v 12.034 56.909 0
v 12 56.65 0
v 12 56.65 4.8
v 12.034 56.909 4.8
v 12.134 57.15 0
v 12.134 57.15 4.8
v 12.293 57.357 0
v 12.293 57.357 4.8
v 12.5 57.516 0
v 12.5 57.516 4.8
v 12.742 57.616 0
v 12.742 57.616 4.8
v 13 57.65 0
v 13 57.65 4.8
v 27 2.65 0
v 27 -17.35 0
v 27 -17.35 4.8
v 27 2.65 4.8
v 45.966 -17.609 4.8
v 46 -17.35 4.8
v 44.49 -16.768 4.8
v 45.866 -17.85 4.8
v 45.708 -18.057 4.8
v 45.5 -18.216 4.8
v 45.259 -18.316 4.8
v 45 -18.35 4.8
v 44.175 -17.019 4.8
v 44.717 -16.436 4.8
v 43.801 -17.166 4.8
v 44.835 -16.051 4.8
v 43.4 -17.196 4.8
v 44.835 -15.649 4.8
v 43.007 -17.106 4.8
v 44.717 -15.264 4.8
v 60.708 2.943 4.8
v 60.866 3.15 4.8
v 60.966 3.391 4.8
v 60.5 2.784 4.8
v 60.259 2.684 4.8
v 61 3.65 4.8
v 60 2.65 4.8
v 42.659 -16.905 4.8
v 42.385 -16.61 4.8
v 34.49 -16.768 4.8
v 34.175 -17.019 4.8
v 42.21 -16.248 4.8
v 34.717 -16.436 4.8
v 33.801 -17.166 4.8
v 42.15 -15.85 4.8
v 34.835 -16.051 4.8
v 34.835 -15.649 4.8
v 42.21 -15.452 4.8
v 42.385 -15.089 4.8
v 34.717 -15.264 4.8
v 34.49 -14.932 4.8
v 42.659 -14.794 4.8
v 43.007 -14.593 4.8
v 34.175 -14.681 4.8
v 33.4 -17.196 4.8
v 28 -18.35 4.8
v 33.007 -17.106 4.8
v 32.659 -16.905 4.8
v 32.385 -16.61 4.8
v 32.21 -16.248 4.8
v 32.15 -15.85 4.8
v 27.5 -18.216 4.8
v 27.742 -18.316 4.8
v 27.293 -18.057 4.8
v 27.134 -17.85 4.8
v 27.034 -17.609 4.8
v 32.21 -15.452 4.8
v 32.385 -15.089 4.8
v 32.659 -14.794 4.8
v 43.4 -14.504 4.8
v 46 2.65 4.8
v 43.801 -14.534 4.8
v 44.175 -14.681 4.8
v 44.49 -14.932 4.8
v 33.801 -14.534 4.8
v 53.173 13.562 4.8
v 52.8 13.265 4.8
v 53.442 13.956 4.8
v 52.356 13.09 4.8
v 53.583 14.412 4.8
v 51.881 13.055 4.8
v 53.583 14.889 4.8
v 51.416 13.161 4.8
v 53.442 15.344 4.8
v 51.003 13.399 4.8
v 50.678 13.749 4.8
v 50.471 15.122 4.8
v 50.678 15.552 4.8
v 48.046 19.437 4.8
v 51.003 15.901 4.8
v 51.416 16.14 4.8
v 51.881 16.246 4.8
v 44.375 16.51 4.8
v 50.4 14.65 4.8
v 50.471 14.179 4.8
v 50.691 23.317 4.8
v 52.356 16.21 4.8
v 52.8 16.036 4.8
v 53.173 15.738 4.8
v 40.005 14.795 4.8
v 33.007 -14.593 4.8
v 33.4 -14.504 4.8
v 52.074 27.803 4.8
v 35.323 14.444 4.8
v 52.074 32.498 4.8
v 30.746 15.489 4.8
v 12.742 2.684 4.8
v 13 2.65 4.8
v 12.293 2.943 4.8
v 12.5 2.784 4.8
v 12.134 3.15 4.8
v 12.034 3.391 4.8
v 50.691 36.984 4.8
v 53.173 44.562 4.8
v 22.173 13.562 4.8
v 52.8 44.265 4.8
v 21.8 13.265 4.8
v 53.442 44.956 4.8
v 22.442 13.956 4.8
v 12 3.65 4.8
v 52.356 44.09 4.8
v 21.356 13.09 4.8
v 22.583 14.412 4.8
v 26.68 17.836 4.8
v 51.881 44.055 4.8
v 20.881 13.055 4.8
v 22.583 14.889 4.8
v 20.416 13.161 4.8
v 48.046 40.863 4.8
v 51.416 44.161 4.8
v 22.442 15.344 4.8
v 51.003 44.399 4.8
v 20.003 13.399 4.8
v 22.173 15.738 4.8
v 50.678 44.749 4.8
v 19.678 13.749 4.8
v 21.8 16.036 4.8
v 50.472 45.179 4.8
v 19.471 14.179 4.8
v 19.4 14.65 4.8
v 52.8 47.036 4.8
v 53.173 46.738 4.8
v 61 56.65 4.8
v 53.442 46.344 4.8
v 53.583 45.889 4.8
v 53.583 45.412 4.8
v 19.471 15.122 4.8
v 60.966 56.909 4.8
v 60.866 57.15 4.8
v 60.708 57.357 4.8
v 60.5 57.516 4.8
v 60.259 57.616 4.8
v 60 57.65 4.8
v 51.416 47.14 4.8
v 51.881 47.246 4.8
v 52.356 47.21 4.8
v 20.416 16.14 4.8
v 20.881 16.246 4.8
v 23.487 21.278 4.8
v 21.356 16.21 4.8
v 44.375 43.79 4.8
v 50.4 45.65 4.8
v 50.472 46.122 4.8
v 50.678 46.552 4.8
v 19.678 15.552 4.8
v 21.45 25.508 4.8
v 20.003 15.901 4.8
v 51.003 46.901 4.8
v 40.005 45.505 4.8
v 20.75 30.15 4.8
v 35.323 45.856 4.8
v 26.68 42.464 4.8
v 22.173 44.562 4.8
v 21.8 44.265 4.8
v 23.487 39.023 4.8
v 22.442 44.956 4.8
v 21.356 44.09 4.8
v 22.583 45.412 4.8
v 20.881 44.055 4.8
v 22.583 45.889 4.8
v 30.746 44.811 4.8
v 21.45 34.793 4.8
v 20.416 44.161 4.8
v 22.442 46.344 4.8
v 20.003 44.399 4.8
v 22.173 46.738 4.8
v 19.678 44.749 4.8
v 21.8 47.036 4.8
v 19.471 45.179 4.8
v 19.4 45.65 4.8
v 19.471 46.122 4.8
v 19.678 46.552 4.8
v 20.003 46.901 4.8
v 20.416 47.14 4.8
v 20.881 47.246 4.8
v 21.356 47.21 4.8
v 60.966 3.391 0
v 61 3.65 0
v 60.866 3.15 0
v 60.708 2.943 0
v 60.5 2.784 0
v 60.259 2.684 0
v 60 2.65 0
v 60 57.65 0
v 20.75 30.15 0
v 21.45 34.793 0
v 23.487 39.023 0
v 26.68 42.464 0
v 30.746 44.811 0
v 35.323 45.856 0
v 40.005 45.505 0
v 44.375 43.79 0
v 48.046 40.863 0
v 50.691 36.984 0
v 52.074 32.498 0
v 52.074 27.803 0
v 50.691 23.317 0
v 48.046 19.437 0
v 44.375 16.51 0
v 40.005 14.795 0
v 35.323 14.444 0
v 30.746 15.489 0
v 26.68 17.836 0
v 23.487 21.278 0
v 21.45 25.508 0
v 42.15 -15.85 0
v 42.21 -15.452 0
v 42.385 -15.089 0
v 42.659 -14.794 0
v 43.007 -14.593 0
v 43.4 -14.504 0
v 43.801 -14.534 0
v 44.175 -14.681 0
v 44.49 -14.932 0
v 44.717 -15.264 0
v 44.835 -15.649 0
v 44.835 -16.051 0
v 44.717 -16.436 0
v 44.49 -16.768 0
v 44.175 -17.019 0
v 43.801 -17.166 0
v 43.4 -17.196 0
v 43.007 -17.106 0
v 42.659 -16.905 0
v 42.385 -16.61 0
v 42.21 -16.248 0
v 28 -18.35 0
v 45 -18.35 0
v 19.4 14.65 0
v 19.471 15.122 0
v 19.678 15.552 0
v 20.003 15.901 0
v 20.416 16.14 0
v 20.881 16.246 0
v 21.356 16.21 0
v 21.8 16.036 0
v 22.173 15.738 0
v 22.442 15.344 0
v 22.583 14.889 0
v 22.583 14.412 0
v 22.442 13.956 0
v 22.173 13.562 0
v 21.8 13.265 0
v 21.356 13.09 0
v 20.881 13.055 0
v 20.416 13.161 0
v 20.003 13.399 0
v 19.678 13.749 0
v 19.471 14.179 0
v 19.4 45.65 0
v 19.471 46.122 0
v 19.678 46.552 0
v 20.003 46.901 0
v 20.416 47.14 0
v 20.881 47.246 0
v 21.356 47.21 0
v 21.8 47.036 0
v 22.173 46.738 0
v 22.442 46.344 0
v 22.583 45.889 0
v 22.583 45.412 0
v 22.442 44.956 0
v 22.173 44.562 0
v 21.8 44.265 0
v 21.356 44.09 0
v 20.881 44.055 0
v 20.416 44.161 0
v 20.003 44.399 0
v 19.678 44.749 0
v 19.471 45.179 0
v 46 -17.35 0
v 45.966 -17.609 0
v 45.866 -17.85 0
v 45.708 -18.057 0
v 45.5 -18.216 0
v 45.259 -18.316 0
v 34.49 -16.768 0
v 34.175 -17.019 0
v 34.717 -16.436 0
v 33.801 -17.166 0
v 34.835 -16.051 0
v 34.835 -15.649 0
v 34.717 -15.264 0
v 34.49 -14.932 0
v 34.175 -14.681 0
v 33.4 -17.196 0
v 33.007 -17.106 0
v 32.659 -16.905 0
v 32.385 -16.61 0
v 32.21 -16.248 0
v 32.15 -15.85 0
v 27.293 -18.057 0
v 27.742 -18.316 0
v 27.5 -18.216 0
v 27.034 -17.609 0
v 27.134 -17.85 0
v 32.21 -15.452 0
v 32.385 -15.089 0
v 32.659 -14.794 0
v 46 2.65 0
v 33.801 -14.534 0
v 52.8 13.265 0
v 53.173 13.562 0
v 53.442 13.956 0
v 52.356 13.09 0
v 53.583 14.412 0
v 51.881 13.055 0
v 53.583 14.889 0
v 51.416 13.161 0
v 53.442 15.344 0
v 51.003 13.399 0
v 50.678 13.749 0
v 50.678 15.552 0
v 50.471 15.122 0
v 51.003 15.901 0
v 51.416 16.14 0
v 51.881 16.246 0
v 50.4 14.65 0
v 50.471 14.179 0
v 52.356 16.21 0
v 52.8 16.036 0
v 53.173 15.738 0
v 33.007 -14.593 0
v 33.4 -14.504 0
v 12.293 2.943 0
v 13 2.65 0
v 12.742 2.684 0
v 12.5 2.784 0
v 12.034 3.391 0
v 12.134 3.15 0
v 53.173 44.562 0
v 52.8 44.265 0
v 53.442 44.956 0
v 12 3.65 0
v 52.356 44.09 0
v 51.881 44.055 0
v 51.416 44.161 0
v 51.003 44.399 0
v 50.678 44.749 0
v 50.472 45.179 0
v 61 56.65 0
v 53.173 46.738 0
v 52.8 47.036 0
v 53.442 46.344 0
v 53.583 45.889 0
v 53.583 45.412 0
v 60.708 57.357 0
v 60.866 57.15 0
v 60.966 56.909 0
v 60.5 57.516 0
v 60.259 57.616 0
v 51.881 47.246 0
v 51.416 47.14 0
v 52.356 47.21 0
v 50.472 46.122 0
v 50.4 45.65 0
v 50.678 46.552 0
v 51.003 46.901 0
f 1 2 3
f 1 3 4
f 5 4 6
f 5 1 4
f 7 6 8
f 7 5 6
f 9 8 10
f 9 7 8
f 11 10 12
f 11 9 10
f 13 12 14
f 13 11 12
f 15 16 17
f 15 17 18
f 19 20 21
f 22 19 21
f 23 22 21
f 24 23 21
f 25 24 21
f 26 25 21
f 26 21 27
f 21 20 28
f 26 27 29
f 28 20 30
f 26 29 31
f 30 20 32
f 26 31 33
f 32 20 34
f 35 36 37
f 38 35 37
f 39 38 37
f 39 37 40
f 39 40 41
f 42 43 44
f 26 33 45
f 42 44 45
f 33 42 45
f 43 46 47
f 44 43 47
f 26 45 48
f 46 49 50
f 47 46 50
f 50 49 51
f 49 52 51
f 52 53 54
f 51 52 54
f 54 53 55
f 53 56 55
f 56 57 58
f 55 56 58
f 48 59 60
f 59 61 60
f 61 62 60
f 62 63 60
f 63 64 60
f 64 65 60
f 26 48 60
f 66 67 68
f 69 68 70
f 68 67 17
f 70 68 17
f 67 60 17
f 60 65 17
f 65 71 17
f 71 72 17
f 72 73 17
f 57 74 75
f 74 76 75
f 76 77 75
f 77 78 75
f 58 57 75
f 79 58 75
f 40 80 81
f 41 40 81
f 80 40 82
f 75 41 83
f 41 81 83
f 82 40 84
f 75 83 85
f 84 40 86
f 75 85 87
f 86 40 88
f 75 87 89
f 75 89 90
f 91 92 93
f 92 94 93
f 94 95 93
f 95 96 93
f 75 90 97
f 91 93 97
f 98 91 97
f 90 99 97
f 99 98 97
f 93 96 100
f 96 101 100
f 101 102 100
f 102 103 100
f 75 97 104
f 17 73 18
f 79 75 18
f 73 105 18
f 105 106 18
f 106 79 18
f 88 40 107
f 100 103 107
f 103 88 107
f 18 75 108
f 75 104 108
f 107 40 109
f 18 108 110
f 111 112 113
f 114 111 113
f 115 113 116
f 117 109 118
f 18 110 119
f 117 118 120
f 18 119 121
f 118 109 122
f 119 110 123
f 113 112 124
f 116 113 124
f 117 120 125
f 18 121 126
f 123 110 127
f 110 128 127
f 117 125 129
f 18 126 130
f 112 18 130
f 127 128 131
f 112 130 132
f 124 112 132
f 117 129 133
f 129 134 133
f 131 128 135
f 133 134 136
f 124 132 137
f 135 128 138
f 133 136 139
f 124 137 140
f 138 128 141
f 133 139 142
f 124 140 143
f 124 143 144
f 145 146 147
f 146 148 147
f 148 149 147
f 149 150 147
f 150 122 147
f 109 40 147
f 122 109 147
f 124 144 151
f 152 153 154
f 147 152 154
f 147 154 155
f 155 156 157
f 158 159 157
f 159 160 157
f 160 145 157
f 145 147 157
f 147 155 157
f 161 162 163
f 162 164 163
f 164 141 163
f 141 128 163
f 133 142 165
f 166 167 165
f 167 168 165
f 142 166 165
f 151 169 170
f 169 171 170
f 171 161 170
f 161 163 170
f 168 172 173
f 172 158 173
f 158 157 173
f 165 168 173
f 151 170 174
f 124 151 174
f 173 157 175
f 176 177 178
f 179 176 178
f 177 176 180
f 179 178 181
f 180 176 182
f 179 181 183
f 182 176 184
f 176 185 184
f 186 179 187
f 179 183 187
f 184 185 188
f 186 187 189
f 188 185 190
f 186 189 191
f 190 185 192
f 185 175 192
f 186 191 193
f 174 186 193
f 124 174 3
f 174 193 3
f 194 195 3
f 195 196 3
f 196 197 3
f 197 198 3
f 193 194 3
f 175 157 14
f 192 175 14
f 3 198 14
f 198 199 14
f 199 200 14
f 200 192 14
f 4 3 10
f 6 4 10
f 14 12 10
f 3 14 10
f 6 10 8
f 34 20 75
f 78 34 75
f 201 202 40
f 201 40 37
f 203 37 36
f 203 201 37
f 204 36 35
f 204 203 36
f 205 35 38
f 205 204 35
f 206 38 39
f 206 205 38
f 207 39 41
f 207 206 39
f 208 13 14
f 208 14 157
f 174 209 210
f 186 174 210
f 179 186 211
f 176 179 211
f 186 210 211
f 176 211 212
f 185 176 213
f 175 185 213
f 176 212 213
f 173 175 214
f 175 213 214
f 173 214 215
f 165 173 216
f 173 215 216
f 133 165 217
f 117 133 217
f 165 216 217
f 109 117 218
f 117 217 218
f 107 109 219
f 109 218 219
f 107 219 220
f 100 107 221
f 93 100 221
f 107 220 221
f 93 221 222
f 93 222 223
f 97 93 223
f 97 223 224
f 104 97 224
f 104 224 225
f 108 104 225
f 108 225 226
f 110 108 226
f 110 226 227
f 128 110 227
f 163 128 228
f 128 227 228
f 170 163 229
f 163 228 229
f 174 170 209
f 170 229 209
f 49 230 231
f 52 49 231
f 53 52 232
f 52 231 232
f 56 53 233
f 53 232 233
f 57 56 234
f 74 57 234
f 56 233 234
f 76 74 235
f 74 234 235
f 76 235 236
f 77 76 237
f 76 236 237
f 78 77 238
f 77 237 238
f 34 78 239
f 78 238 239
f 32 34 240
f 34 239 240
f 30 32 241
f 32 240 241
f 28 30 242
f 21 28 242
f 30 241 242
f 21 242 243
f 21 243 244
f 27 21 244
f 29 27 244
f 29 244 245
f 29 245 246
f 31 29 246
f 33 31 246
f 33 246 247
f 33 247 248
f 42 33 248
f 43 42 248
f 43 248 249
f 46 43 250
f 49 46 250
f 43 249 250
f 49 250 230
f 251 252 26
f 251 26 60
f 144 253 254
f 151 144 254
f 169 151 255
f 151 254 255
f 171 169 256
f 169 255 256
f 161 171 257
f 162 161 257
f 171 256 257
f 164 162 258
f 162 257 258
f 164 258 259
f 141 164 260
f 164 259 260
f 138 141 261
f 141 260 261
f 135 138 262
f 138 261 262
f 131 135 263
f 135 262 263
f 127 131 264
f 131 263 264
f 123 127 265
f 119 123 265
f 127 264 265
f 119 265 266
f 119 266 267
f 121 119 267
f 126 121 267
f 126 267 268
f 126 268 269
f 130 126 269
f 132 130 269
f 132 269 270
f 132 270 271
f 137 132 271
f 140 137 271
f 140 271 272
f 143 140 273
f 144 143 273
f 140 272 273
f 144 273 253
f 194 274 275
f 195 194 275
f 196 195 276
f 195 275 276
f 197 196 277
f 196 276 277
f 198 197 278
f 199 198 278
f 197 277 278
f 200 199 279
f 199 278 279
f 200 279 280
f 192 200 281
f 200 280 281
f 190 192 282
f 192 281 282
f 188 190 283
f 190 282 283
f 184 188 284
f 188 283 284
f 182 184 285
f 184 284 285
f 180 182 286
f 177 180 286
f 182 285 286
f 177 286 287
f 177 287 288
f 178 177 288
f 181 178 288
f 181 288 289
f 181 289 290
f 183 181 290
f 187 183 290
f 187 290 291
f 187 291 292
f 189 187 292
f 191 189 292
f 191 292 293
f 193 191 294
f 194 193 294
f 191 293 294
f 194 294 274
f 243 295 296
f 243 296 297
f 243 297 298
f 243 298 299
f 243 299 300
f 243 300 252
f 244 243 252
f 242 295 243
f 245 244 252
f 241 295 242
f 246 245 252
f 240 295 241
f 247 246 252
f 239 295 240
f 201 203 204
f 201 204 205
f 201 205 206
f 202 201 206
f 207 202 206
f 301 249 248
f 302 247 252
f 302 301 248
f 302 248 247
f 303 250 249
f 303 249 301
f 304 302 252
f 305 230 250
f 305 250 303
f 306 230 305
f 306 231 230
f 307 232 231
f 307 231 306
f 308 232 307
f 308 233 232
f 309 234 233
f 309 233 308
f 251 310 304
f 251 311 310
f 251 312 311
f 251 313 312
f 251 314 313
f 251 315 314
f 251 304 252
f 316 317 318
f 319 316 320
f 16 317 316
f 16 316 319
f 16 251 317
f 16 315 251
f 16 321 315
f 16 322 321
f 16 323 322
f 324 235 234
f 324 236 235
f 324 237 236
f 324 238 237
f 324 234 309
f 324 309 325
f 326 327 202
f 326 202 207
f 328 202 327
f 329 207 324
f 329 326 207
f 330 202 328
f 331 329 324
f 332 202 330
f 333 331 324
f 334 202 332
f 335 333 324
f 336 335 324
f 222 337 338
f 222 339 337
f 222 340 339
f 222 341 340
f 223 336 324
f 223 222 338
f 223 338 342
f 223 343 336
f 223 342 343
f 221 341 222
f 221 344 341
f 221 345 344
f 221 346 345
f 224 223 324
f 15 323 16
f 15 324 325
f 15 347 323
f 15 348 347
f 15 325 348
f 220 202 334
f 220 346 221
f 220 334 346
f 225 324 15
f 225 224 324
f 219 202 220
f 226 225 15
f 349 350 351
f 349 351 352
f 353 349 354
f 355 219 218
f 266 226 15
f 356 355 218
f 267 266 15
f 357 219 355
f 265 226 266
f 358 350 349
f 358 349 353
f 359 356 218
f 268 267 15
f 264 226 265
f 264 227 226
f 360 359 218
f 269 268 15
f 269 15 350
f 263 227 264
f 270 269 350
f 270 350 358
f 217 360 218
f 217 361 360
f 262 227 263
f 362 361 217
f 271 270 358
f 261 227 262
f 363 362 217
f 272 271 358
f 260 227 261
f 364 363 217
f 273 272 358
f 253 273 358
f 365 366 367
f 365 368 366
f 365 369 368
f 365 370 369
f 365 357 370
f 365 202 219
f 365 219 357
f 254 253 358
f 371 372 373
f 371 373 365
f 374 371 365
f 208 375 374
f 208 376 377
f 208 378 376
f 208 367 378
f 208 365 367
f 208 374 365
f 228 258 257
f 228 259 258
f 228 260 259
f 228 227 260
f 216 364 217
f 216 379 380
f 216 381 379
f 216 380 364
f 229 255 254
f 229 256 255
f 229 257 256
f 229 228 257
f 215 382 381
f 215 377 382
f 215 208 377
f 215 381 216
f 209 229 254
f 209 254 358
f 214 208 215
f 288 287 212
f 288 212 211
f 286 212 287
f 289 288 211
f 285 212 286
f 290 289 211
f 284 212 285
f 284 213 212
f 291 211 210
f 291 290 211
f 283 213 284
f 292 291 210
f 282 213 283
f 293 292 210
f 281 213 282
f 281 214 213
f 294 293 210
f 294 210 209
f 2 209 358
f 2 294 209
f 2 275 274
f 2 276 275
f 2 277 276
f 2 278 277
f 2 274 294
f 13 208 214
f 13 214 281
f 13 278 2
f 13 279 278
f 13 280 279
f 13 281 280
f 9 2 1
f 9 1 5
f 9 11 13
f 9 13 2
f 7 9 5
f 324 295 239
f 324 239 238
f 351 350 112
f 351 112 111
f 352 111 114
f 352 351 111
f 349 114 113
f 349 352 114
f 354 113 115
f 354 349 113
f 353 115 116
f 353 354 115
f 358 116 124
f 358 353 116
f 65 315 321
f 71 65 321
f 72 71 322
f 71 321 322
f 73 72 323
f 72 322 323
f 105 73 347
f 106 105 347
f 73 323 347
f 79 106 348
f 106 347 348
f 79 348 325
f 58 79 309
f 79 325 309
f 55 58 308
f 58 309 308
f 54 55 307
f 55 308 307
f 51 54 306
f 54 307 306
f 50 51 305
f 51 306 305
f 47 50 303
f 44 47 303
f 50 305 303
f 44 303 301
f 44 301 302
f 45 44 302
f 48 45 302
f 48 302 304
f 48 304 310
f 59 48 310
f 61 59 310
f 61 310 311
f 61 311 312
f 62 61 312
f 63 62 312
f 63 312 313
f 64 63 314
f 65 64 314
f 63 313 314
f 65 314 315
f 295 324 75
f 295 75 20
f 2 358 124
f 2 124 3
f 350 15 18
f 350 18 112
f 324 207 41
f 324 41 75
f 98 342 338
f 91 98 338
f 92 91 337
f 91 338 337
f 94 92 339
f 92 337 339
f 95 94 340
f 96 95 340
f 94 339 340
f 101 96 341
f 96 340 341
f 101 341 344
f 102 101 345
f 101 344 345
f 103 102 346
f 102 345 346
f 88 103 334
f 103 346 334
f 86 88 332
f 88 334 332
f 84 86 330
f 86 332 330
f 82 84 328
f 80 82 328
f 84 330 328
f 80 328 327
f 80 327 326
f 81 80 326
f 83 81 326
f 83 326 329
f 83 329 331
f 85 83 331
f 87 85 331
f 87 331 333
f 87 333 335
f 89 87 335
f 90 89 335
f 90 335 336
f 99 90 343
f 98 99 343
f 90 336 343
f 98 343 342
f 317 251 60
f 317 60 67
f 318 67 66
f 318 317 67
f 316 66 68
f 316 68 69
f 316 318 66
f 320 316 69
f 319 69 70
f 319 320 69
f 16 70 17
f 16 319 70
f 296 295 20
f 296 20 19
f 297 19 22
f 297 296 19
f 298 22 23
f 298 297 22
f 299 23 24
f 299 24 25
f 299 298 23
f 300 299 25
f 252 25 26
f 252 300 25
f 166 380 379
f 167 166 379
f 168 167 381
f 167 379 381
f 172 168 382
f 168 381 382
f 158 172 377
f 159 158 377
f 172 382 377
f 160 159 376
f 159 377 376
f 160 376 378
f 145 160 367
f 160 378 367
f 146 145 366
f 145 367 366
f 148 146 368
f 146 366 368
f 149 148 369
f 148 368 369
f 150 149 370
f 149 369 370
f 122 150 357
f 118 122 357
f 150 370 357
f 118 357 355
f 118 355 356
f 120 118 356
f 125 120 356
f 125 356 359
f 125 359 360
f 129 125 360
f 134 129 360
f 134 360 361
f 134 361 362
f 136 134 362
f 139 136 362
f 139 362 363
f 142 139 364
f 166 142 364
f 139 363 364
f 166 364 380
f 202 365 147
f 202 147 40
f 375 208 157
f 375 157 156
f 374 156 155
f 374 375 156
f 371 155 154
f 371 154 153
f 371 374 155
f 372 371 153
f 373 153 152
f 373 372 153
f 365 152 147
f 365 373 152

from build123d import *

# Parameters (mm, degrees)
ESQUISSE1_R        = 15.75
ESQUISSE1_R_2      = 1.6
ESQUISSE1_R_3      = 1.35
BOSS_EXTRU_1_DEPTH = 4.8


with BuildPart() as part:
    # Esquisse1 → Boss.-Extru.1 (new body)
    with BuildSketch(Plane(origin=(0, 0, 0), x_dir=(-1, 0, 0), z_dir=(0, 0, -1))):
        with BuildLine():
            Line((-12.0004012, 3.650219609), (-12.0004012, 56.650219609))
            ThreePointArc((-12.0004012, 56.650219609), (-12.293294419, 57.35732639), (-13.0004012, 57.650219609))
            Line((-13.0004012, 57.650219609), (-60.0004012, 57.650219609))
            ThreePointArc((-60.0004012, 57.650219609), (-60.707507981, 57.35732639), (-61.0004012, 56.650219609))
            Line((-61.0004012, 56.650219609), (-61.0004012, 3.650219609))
            ThreePointArc((-61.0004012, 3.650219609), (-60.707507981, 2.943112828), (-60.0004012, 2.650219609))
            Line((-60.0004012, 2.650219609), (-46.0004012, 2.650219609))
            Line((-46.0004012, 2.650219609), (-46.0004012, -17.349780391))
            ThreePointArc((-46.0004012, -17.349780391), (-45.707507981, -18.056887172), (-45.0004012, -18.349780391))
            Line((-45.0004012, -18.349780391), (-28.0004012, -18.349780391))
            ThreePointArc((-28.0004012, -18.349780391), (-27.293294419, -18.056887172), (-27.0004012, -17.349780391))
            Line((-27.0004012, -17.349780391), (-27.0004012, 2.650219609))
            Line((-27.0004012, 2.650219609), (-13.0004012, 2.650219609))
            ThreePointArc((-13.0004012, 2.650219609), (-12.293294419, 2.943112828), (-12.0004012, 3.650219609))
        make_face()
        with Locations((-36.5004012, 30.150219609)):
            Circle(ESQUISSE1_R, mode=Mode.SUBTRACT)
        with Locations((-52.0004012, 14.650219609)):
            Circle(ESQUISSE1_R_2, mode=Mode.SUBTRACT)
        with Locations((-52.000444233, 45.650219609)):
            Circle(ESQUISSE1_R_2, mode=Mode.SUBTRACT)
        with Locations((-21.0004012, 14.650219609)):
            Circle(ESQUISSE1_R_2, mode=Mode.SUBTRACT)
        with Locations((-21.0004012, 45.650219609)):
            Circle(ESQUISSE1_R_2, mode=Mode.SUBTRACT)
        with Locations((-43.5004012, -15.849780391)):
            Circle(ESQUISSE1_R_3, mode=Mode.SUBTRACT)
        with Locations((-33.5004012, -15.849780391)):
            Circle(ESQUISSE1_R_3, mode=Mode.SUBTRACT)
    extrude(amount=-BOSS_EXTRU_1_DEPTH)


solid = part.part
